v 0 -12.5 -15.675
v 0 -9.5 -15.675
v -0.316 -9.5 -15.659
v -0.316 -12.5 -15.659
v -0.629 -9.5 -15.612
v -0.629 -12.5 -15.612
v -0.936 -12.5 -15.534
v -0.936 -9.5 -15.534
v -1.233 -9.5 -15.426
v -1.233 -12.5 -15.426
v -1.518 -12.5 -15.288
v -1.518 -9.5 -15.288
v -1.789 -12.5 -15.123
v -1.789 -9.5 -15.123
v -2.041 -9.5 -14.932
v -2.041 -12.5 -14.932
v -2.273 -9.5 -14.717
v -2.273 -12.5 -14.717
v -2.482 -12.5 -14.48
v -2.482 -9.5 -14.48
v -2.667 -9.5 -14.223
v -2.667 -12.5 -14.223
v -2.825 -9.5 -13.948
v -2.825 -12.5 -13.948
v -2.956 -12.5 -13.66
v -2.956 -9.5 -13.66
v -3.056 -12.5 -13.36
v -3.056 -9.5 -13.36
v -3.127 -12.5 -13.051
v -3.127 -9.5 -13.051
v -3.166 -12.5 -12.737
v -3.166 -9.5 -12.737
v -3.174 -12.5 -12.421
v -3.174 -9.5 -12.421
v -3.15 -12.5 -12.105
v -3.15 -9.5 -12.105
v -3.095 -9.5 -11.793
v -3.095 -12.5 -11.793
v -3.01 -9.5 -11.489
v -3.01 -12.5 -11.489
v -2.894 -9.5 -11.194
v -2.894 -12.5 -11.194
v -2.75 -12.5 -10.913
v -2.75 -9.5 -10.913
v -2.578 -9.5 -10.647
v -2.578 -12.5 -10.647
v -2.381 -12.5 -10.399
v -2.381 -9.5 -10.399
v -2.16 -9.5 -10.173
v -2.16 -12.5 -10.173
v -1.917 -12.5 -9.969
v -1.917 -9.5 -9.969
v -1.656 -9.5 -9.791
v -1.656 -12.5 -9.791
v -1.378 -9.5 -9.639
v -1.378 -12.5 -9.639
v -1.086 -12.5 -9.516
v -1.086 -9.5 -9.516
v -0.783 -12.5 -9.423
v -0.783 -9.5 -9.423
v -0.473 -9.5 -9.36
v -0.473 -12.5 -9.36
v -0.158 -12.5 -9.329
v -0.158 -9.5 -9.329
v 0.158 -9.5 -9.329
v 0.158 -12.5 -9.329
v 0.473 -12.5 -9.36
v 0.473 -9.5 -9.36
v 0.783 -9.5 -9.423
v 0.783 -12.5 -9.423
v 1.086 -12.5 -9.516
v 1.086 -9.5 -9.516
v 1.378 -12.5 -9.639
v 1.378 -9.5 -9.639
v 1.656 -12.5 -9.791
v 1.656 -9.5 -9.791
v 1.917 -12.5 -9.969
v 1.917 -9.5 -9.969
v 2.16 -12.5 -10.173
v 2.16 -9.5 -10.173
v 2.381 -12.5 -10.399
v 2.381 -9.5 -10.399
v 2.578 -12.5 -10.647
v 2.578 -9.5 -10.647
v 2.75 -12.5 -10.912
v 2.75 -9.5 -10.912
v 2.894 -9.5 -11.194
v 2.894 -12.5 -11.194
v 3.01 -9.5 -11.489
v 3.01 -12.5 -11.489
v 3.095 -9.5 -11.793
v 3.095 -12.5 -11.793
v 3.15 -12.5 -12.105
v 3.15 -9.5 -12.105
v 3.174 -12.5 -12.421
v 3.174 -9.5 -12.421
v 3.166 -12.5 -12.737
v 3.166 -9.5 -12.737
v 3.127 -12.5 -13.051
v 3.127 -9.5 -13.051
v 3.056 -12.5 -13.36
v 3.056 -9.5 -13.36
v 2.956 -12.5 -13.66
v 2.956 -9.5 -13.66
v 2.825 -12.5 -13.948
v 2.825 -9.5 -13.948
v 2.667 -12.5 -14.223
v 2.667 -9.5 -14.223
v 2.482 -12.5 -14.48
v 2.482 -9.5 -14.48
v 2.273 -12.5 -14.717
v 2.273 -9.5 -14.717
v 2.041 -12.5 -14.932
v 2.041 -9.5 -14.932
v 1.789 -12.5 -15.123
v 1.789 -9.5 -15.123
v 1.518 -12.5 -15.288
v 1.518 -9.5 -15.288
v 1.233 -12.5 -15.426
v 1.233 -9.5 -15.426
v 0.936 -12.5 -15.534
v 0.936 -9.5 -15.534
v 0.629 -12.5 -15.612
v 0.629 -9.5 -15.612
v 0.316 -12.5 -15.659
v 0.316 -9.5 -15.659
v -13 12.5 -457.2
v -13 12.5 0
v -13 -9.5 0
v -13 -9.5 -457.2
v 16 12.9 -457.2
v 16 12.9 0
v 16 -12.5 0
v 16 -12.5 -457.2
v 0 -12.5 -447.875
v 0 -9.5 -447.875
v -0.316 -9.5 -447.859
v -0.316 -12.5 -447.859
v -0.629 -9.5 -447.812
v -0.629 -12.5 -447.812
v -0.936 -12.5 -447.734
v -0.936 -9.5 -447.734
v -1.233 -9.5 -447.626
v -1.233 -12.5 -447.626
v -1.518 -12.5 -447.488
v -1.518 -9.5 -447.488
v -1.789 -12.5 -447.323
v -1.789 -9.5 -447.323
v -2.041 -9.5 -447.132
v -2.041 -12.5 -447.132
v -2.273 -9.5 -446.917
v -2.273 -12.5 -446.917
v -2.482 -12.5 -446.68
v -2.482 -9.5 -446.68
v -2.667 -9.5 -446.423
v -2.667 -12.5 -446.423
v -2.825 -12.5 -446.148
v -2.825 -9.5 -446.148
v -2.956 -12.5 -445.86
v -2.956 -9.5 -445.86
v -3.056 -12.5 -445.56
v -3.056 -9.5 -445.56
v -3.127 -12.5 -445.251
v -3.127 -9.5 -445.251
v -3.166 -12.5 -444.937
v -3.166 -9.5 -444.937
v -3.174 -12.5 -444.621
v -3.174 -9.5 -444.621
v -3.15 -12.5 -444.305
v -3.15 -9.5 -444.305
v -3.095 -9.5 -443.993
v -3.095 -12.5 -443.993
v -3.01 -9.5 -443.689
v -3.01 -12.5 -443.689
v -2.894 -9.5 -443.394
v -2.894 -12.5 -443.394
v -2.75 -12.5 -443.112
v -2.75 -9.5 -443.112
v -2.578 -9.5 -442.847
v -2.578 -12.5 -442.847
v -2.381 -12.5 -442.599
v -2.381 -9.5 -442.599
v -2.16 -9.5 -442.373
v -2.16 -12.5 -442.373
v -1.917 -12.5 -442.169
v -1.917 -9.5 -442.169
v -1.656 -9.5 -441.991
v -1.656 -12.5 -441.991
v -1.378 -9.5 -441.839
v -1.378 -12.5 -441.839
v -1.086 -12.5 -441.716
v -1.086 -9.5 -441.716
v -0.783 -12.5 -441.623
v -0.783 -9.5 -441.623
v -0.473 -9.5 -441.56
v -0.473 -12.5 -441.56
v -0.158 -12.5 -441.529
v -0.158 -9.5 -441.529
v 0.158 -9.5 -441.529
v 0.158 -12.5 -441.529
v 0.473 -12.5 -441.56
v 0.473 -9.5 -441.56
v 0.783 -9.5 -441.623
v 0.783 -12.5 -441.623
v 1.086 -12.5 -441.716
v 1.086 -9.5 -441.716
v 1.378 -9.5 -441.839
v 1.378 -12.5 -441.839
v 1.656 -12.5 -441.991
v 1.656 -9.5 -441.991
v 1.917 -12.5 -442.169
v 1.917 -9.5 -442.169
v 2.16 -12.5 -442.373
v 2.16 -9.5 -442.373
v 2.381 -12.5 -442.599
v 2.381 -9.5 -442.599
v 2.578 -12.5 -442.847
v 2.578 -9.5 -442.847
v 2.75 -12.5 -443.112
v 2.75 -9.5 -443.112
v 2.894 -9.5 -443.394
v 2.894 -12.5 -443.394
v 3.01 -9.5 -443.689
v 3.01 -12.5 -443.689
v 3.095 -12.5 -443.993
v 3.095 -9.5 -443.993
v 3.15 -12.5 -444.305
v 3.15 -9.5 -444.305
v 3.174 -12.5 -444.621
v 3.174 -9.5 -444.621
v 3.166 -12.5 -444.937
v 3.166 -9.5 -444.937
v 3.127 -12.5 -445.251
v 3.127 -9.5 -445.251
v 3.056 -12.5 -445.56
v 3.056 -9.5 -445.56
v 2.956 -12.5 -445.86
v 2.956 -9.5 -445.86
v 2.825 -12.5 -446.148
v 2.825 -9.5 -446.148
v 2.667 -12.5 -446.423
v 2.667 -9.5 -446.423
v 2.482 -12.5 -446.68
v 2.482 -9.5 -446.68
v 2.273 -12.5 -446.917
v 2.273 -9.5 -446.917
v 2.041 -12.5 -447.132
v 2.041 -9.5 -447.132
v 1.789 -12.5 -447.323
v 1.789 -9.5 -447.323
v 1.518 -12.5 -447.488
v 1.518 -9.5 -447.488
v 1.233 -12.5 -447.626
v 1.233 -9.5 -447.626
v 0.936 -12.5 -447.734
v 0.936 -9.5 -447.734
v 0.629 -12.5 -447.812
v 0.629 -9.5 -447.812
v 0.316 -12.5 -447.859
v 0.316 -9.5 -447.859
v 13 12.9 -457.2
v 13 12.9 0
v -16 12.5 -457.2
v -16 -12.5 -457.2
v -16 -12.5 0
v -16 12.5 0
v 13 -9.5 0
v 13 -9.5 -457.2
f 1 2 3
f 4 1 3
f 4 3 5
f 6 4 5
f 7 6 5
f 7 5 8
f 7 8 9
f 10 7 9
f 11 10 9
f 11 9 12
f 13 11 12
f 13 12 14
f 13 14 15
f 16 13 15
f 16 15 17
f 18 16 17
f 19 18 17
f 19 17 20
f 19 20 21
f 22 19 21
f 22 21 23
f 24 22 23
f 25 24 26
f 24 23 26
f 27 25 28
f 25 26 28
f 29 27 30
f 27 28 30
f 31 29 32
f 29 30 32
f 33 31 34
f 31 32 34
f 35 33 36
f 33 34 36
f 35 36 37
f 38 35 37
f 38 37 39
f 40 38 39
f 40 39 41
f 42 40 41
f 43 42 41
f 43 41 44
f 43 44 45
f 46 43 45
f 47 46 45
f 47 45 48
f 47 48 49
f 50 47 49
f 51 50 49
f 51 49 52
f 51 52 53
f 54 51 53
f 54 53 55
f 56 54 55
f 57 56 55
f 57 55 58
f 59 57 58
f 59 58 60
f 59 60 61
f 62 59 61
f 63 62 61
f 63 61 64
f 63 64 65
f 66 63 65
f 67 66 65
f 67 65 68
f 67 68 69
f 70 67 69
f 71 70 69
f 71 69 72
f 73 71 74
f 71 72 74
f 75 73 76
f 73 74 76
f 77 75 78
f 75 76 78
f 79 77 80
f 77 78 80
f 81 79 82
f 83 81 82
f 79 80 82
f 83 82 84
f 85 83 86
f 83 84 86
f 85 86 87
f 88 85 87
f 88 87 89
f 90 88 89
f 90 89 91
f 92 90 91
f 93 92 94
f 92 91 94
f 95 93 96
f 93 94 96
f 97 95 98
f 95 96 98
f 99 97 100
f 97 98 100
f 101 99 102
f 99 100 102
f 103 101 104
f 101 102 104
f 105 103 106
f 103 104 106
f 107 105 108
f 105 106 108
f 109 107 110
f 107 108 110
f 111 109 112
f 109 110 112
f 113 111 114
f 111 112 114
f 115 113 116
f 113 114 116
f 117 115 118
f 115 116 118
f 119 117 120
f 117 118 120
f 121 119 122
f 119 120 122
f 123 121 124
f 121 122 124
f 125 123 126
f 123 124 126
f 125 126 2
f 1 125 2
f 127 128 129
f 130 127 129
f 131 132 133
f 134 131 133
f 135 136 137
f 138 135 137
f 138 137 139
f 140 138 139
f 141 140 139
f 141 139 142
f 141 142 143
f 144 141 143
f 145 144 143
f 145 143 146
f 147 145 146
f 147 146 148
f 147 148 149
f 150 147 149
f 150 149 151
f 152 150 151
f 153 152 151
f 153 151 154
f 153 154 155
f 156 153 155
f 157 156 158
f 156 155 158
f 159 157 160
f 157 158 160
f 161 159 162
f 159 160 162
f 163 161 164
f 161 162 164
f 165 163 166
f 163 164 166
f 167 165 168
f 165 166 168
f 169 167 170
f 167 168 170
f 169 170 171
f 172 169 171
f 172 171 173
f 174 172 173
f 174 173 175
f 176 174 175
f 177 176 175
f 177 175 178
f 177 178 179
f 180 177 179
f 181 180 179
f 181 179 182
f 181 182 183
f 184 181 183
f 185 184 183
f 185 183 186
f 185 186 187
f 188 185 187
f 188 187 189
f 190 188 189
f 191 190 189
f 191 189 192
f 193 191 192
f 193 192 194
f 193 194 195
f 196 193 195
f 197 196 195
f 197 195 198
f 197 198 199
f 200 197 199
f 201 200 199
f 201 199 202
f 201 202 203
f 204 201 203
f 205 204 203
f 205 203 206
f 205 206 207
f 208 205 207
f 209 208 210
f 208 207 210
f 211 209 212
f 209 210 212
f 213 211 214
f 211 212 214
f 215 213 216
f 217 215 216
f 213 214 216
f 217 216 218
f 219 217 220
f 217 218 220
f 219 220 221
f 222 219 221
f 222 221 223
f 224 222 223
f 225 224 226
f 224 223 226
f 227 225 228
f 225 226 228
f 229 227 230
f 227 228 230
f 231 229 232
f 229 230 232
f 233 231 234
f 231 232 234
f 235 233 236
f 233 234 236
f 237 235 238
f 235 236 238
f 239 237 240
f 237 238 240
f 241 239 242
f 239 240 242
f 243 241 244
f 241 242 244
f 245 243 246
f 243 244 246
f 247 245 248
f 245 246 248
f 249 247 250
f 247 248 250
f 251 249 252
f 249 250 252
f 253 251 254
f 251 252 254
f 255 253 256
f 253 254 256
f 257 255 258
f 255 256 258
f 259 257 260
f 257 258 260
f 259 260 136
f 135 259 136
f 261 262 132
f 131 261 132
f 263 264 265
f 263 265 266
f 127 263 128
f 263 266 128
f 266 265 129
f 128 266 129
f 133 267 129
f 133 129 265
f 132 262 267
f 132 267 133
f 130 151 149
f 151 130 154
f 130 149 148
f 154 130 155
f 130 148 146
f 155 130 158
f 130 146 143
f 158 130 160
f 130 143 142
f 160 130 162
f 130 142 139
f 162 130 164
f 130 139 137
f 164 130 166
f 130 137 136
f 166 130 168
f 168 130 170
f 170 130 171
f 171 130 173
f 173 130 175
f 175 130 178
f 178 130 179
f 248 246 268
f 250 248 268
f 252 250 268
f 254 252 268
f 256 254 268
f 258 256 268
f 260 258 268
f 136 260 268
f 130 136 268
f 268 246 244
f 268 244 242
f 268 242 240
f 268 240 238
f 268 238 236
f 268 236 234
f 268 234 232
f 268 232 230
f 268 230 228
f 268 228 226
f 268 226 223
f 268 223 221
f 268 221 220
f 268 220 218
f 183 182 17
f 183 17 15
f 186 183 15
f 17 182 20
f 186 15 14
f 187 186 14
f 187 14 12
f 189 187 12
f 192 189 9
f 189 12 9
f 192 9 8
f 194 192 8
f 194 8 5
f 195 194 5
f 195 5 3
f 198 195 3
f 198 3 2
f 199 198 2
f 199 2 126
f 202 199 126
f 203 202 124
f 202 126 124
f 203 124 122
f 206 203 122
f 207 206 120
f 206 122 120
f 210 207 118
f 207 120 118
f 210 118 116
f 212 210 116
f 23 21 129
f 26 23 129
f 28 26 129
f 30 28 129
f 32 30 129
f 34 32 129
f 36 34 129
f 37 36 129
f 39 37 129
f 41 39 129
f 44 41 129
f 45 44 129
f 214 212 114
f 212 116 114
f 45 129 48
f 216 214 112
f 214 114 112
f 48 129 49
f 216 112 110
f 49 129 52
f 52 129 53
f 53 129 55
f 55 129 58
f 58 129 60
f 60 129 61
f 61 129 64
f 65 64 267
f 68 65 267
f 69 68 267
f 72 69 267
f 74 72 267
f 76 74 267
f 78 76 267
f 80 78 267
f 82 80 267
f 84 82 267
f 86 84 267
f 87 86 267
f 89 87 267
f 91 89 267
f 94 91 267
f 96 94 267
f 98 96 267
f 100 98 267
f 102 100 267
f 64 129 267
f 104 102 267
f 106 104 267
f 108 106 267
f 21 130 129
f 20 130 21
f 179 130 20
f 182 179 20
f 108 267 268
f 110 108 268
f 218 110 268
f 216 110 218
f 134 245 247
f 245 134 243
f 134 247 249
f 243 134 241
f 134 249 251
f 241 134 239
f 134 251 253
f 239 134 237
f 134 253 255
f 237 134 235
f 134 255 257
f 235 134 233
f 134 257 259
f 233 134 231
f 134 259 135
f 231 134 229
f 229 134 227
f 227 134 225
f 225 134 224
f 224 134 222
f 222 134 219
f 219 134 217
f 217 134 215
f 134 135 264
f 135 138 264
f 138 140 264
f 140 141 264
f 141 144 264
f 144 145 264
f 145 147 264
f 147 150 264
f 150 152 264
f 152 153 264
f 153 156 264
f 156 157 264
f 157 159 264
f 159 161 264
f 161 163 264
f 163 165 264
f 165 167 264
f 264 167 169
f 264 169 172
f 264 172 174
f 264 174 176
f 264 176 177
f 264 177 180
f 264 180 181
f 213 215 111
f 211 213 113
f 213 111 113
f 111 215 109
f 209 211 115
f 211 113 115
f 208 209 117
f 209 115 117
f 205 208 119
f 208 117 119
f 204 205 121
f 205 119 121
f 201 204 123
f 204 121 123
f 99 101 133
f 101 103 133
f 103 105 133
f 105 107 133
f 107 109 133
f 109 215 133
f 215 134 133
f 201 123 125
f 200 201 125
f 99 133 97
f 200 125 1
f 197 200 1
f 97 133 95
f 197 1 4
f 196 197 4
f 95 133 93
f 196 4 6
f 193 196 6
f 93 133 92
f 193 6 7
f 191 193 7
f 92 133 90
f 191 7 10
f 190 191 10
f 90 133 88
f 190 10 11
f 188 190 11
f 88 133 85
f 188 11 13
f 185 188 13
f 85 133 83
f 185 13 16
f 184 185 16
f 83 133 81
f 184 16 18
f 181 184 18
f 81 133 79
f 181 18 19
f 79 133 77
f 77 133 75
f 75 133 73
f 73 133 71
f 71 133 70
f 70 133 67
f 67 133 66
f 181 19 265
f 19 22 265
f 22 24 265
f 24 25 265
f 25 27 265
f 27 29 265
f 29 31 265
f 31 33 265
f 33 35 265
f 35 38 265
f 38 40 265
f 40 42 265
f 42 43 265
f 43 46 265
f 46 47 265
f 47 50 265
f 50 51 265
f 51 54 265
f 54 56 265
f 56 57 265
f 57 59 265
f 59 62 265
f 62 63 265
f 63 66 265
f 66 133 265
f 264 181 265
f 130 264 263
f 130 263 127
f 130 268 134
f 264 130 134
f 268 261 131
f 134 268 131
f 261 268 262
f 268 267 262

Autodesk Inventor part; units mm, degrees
ref_plane "YZ Plane" through (0, 0, 0) normal (1, 0, 0) x (0, 1, 0)
ref_plane "XZ Plane" through (0, 0, 0) normal (0, 1, 0) x (-1, 0, 0)
ref_plane "XY Plane" through (0, 0, 0) normal (0, 0, 1) x (1, 0, 0)
sketch "Sketch1" plane through (0, 0, 0) normal (0, 0, 1) x (1, 0, 0)
  line L0 (-16, 12.5) -> (-13, 12.5)
  line L1 (-13, 12.5) -> (-13, -9.5)
  line L2 (-13, -9.5) -> (13, -9.5)
  line L3 (13, -9.5) -> (13, 12.9)
  line L4 (13, 12.9) -> (16, 12.9)
  line L5 (16, 12.9) -> (16, -12.5)
  line L6 (16, -12.5) -> (-16, -12.5)
  line L7 (-16, -12.5) -> (-16, 12.5)
  point P0 (0, 0)
  dimension "d0" = 3
  dimension "d2" = 3
  dimension "d3" = 25
  dimension "d4" = 32
  dimension "d5" = 16
  dimension "d7" = 12.5
  dimension "d8" = 3
extrude "Extrusion1" add sketch "Sketch1" against normal blind 457.2
sketch "Sketch10" plane through (-16, -12.5, 0) normal (0, -1, 0) x (1, 0, 0)
  line L0 (32, 0) -> (0, 0) projected
  line L1 (0, 0) -> (0, -457.2) projected
  line L2 (32, -457.2) -> (0, -457.2) projected
  circle A0 centre (16, -12.5) radius 3.175
  circle A1 centre (16, -444.7) radius 3.175
  point P0 (16, 0)
  dimension "d34" = 6.35
  dimension "d35" = 12.5
  dimension "d36" = 12.5
  dimension "d37" = 16
  dimension "d38" = 6.35
hole "Hole1" at (0, -12.5, -444.7) at (0, -12.5, -12.5) direction (0, 1, 0) diameter 6.35 depth 3 tip angle 118
equation "\"d2\" = d0"
equation "\"d5\" = 0.5 * d4"
equation "\"d7\" = 0.5 * d3"
equation "\"d8\" = d0"
equation "\"d36\" = d35"
properties part number "18in C-Channel Front" material "Aluminum 6061"
